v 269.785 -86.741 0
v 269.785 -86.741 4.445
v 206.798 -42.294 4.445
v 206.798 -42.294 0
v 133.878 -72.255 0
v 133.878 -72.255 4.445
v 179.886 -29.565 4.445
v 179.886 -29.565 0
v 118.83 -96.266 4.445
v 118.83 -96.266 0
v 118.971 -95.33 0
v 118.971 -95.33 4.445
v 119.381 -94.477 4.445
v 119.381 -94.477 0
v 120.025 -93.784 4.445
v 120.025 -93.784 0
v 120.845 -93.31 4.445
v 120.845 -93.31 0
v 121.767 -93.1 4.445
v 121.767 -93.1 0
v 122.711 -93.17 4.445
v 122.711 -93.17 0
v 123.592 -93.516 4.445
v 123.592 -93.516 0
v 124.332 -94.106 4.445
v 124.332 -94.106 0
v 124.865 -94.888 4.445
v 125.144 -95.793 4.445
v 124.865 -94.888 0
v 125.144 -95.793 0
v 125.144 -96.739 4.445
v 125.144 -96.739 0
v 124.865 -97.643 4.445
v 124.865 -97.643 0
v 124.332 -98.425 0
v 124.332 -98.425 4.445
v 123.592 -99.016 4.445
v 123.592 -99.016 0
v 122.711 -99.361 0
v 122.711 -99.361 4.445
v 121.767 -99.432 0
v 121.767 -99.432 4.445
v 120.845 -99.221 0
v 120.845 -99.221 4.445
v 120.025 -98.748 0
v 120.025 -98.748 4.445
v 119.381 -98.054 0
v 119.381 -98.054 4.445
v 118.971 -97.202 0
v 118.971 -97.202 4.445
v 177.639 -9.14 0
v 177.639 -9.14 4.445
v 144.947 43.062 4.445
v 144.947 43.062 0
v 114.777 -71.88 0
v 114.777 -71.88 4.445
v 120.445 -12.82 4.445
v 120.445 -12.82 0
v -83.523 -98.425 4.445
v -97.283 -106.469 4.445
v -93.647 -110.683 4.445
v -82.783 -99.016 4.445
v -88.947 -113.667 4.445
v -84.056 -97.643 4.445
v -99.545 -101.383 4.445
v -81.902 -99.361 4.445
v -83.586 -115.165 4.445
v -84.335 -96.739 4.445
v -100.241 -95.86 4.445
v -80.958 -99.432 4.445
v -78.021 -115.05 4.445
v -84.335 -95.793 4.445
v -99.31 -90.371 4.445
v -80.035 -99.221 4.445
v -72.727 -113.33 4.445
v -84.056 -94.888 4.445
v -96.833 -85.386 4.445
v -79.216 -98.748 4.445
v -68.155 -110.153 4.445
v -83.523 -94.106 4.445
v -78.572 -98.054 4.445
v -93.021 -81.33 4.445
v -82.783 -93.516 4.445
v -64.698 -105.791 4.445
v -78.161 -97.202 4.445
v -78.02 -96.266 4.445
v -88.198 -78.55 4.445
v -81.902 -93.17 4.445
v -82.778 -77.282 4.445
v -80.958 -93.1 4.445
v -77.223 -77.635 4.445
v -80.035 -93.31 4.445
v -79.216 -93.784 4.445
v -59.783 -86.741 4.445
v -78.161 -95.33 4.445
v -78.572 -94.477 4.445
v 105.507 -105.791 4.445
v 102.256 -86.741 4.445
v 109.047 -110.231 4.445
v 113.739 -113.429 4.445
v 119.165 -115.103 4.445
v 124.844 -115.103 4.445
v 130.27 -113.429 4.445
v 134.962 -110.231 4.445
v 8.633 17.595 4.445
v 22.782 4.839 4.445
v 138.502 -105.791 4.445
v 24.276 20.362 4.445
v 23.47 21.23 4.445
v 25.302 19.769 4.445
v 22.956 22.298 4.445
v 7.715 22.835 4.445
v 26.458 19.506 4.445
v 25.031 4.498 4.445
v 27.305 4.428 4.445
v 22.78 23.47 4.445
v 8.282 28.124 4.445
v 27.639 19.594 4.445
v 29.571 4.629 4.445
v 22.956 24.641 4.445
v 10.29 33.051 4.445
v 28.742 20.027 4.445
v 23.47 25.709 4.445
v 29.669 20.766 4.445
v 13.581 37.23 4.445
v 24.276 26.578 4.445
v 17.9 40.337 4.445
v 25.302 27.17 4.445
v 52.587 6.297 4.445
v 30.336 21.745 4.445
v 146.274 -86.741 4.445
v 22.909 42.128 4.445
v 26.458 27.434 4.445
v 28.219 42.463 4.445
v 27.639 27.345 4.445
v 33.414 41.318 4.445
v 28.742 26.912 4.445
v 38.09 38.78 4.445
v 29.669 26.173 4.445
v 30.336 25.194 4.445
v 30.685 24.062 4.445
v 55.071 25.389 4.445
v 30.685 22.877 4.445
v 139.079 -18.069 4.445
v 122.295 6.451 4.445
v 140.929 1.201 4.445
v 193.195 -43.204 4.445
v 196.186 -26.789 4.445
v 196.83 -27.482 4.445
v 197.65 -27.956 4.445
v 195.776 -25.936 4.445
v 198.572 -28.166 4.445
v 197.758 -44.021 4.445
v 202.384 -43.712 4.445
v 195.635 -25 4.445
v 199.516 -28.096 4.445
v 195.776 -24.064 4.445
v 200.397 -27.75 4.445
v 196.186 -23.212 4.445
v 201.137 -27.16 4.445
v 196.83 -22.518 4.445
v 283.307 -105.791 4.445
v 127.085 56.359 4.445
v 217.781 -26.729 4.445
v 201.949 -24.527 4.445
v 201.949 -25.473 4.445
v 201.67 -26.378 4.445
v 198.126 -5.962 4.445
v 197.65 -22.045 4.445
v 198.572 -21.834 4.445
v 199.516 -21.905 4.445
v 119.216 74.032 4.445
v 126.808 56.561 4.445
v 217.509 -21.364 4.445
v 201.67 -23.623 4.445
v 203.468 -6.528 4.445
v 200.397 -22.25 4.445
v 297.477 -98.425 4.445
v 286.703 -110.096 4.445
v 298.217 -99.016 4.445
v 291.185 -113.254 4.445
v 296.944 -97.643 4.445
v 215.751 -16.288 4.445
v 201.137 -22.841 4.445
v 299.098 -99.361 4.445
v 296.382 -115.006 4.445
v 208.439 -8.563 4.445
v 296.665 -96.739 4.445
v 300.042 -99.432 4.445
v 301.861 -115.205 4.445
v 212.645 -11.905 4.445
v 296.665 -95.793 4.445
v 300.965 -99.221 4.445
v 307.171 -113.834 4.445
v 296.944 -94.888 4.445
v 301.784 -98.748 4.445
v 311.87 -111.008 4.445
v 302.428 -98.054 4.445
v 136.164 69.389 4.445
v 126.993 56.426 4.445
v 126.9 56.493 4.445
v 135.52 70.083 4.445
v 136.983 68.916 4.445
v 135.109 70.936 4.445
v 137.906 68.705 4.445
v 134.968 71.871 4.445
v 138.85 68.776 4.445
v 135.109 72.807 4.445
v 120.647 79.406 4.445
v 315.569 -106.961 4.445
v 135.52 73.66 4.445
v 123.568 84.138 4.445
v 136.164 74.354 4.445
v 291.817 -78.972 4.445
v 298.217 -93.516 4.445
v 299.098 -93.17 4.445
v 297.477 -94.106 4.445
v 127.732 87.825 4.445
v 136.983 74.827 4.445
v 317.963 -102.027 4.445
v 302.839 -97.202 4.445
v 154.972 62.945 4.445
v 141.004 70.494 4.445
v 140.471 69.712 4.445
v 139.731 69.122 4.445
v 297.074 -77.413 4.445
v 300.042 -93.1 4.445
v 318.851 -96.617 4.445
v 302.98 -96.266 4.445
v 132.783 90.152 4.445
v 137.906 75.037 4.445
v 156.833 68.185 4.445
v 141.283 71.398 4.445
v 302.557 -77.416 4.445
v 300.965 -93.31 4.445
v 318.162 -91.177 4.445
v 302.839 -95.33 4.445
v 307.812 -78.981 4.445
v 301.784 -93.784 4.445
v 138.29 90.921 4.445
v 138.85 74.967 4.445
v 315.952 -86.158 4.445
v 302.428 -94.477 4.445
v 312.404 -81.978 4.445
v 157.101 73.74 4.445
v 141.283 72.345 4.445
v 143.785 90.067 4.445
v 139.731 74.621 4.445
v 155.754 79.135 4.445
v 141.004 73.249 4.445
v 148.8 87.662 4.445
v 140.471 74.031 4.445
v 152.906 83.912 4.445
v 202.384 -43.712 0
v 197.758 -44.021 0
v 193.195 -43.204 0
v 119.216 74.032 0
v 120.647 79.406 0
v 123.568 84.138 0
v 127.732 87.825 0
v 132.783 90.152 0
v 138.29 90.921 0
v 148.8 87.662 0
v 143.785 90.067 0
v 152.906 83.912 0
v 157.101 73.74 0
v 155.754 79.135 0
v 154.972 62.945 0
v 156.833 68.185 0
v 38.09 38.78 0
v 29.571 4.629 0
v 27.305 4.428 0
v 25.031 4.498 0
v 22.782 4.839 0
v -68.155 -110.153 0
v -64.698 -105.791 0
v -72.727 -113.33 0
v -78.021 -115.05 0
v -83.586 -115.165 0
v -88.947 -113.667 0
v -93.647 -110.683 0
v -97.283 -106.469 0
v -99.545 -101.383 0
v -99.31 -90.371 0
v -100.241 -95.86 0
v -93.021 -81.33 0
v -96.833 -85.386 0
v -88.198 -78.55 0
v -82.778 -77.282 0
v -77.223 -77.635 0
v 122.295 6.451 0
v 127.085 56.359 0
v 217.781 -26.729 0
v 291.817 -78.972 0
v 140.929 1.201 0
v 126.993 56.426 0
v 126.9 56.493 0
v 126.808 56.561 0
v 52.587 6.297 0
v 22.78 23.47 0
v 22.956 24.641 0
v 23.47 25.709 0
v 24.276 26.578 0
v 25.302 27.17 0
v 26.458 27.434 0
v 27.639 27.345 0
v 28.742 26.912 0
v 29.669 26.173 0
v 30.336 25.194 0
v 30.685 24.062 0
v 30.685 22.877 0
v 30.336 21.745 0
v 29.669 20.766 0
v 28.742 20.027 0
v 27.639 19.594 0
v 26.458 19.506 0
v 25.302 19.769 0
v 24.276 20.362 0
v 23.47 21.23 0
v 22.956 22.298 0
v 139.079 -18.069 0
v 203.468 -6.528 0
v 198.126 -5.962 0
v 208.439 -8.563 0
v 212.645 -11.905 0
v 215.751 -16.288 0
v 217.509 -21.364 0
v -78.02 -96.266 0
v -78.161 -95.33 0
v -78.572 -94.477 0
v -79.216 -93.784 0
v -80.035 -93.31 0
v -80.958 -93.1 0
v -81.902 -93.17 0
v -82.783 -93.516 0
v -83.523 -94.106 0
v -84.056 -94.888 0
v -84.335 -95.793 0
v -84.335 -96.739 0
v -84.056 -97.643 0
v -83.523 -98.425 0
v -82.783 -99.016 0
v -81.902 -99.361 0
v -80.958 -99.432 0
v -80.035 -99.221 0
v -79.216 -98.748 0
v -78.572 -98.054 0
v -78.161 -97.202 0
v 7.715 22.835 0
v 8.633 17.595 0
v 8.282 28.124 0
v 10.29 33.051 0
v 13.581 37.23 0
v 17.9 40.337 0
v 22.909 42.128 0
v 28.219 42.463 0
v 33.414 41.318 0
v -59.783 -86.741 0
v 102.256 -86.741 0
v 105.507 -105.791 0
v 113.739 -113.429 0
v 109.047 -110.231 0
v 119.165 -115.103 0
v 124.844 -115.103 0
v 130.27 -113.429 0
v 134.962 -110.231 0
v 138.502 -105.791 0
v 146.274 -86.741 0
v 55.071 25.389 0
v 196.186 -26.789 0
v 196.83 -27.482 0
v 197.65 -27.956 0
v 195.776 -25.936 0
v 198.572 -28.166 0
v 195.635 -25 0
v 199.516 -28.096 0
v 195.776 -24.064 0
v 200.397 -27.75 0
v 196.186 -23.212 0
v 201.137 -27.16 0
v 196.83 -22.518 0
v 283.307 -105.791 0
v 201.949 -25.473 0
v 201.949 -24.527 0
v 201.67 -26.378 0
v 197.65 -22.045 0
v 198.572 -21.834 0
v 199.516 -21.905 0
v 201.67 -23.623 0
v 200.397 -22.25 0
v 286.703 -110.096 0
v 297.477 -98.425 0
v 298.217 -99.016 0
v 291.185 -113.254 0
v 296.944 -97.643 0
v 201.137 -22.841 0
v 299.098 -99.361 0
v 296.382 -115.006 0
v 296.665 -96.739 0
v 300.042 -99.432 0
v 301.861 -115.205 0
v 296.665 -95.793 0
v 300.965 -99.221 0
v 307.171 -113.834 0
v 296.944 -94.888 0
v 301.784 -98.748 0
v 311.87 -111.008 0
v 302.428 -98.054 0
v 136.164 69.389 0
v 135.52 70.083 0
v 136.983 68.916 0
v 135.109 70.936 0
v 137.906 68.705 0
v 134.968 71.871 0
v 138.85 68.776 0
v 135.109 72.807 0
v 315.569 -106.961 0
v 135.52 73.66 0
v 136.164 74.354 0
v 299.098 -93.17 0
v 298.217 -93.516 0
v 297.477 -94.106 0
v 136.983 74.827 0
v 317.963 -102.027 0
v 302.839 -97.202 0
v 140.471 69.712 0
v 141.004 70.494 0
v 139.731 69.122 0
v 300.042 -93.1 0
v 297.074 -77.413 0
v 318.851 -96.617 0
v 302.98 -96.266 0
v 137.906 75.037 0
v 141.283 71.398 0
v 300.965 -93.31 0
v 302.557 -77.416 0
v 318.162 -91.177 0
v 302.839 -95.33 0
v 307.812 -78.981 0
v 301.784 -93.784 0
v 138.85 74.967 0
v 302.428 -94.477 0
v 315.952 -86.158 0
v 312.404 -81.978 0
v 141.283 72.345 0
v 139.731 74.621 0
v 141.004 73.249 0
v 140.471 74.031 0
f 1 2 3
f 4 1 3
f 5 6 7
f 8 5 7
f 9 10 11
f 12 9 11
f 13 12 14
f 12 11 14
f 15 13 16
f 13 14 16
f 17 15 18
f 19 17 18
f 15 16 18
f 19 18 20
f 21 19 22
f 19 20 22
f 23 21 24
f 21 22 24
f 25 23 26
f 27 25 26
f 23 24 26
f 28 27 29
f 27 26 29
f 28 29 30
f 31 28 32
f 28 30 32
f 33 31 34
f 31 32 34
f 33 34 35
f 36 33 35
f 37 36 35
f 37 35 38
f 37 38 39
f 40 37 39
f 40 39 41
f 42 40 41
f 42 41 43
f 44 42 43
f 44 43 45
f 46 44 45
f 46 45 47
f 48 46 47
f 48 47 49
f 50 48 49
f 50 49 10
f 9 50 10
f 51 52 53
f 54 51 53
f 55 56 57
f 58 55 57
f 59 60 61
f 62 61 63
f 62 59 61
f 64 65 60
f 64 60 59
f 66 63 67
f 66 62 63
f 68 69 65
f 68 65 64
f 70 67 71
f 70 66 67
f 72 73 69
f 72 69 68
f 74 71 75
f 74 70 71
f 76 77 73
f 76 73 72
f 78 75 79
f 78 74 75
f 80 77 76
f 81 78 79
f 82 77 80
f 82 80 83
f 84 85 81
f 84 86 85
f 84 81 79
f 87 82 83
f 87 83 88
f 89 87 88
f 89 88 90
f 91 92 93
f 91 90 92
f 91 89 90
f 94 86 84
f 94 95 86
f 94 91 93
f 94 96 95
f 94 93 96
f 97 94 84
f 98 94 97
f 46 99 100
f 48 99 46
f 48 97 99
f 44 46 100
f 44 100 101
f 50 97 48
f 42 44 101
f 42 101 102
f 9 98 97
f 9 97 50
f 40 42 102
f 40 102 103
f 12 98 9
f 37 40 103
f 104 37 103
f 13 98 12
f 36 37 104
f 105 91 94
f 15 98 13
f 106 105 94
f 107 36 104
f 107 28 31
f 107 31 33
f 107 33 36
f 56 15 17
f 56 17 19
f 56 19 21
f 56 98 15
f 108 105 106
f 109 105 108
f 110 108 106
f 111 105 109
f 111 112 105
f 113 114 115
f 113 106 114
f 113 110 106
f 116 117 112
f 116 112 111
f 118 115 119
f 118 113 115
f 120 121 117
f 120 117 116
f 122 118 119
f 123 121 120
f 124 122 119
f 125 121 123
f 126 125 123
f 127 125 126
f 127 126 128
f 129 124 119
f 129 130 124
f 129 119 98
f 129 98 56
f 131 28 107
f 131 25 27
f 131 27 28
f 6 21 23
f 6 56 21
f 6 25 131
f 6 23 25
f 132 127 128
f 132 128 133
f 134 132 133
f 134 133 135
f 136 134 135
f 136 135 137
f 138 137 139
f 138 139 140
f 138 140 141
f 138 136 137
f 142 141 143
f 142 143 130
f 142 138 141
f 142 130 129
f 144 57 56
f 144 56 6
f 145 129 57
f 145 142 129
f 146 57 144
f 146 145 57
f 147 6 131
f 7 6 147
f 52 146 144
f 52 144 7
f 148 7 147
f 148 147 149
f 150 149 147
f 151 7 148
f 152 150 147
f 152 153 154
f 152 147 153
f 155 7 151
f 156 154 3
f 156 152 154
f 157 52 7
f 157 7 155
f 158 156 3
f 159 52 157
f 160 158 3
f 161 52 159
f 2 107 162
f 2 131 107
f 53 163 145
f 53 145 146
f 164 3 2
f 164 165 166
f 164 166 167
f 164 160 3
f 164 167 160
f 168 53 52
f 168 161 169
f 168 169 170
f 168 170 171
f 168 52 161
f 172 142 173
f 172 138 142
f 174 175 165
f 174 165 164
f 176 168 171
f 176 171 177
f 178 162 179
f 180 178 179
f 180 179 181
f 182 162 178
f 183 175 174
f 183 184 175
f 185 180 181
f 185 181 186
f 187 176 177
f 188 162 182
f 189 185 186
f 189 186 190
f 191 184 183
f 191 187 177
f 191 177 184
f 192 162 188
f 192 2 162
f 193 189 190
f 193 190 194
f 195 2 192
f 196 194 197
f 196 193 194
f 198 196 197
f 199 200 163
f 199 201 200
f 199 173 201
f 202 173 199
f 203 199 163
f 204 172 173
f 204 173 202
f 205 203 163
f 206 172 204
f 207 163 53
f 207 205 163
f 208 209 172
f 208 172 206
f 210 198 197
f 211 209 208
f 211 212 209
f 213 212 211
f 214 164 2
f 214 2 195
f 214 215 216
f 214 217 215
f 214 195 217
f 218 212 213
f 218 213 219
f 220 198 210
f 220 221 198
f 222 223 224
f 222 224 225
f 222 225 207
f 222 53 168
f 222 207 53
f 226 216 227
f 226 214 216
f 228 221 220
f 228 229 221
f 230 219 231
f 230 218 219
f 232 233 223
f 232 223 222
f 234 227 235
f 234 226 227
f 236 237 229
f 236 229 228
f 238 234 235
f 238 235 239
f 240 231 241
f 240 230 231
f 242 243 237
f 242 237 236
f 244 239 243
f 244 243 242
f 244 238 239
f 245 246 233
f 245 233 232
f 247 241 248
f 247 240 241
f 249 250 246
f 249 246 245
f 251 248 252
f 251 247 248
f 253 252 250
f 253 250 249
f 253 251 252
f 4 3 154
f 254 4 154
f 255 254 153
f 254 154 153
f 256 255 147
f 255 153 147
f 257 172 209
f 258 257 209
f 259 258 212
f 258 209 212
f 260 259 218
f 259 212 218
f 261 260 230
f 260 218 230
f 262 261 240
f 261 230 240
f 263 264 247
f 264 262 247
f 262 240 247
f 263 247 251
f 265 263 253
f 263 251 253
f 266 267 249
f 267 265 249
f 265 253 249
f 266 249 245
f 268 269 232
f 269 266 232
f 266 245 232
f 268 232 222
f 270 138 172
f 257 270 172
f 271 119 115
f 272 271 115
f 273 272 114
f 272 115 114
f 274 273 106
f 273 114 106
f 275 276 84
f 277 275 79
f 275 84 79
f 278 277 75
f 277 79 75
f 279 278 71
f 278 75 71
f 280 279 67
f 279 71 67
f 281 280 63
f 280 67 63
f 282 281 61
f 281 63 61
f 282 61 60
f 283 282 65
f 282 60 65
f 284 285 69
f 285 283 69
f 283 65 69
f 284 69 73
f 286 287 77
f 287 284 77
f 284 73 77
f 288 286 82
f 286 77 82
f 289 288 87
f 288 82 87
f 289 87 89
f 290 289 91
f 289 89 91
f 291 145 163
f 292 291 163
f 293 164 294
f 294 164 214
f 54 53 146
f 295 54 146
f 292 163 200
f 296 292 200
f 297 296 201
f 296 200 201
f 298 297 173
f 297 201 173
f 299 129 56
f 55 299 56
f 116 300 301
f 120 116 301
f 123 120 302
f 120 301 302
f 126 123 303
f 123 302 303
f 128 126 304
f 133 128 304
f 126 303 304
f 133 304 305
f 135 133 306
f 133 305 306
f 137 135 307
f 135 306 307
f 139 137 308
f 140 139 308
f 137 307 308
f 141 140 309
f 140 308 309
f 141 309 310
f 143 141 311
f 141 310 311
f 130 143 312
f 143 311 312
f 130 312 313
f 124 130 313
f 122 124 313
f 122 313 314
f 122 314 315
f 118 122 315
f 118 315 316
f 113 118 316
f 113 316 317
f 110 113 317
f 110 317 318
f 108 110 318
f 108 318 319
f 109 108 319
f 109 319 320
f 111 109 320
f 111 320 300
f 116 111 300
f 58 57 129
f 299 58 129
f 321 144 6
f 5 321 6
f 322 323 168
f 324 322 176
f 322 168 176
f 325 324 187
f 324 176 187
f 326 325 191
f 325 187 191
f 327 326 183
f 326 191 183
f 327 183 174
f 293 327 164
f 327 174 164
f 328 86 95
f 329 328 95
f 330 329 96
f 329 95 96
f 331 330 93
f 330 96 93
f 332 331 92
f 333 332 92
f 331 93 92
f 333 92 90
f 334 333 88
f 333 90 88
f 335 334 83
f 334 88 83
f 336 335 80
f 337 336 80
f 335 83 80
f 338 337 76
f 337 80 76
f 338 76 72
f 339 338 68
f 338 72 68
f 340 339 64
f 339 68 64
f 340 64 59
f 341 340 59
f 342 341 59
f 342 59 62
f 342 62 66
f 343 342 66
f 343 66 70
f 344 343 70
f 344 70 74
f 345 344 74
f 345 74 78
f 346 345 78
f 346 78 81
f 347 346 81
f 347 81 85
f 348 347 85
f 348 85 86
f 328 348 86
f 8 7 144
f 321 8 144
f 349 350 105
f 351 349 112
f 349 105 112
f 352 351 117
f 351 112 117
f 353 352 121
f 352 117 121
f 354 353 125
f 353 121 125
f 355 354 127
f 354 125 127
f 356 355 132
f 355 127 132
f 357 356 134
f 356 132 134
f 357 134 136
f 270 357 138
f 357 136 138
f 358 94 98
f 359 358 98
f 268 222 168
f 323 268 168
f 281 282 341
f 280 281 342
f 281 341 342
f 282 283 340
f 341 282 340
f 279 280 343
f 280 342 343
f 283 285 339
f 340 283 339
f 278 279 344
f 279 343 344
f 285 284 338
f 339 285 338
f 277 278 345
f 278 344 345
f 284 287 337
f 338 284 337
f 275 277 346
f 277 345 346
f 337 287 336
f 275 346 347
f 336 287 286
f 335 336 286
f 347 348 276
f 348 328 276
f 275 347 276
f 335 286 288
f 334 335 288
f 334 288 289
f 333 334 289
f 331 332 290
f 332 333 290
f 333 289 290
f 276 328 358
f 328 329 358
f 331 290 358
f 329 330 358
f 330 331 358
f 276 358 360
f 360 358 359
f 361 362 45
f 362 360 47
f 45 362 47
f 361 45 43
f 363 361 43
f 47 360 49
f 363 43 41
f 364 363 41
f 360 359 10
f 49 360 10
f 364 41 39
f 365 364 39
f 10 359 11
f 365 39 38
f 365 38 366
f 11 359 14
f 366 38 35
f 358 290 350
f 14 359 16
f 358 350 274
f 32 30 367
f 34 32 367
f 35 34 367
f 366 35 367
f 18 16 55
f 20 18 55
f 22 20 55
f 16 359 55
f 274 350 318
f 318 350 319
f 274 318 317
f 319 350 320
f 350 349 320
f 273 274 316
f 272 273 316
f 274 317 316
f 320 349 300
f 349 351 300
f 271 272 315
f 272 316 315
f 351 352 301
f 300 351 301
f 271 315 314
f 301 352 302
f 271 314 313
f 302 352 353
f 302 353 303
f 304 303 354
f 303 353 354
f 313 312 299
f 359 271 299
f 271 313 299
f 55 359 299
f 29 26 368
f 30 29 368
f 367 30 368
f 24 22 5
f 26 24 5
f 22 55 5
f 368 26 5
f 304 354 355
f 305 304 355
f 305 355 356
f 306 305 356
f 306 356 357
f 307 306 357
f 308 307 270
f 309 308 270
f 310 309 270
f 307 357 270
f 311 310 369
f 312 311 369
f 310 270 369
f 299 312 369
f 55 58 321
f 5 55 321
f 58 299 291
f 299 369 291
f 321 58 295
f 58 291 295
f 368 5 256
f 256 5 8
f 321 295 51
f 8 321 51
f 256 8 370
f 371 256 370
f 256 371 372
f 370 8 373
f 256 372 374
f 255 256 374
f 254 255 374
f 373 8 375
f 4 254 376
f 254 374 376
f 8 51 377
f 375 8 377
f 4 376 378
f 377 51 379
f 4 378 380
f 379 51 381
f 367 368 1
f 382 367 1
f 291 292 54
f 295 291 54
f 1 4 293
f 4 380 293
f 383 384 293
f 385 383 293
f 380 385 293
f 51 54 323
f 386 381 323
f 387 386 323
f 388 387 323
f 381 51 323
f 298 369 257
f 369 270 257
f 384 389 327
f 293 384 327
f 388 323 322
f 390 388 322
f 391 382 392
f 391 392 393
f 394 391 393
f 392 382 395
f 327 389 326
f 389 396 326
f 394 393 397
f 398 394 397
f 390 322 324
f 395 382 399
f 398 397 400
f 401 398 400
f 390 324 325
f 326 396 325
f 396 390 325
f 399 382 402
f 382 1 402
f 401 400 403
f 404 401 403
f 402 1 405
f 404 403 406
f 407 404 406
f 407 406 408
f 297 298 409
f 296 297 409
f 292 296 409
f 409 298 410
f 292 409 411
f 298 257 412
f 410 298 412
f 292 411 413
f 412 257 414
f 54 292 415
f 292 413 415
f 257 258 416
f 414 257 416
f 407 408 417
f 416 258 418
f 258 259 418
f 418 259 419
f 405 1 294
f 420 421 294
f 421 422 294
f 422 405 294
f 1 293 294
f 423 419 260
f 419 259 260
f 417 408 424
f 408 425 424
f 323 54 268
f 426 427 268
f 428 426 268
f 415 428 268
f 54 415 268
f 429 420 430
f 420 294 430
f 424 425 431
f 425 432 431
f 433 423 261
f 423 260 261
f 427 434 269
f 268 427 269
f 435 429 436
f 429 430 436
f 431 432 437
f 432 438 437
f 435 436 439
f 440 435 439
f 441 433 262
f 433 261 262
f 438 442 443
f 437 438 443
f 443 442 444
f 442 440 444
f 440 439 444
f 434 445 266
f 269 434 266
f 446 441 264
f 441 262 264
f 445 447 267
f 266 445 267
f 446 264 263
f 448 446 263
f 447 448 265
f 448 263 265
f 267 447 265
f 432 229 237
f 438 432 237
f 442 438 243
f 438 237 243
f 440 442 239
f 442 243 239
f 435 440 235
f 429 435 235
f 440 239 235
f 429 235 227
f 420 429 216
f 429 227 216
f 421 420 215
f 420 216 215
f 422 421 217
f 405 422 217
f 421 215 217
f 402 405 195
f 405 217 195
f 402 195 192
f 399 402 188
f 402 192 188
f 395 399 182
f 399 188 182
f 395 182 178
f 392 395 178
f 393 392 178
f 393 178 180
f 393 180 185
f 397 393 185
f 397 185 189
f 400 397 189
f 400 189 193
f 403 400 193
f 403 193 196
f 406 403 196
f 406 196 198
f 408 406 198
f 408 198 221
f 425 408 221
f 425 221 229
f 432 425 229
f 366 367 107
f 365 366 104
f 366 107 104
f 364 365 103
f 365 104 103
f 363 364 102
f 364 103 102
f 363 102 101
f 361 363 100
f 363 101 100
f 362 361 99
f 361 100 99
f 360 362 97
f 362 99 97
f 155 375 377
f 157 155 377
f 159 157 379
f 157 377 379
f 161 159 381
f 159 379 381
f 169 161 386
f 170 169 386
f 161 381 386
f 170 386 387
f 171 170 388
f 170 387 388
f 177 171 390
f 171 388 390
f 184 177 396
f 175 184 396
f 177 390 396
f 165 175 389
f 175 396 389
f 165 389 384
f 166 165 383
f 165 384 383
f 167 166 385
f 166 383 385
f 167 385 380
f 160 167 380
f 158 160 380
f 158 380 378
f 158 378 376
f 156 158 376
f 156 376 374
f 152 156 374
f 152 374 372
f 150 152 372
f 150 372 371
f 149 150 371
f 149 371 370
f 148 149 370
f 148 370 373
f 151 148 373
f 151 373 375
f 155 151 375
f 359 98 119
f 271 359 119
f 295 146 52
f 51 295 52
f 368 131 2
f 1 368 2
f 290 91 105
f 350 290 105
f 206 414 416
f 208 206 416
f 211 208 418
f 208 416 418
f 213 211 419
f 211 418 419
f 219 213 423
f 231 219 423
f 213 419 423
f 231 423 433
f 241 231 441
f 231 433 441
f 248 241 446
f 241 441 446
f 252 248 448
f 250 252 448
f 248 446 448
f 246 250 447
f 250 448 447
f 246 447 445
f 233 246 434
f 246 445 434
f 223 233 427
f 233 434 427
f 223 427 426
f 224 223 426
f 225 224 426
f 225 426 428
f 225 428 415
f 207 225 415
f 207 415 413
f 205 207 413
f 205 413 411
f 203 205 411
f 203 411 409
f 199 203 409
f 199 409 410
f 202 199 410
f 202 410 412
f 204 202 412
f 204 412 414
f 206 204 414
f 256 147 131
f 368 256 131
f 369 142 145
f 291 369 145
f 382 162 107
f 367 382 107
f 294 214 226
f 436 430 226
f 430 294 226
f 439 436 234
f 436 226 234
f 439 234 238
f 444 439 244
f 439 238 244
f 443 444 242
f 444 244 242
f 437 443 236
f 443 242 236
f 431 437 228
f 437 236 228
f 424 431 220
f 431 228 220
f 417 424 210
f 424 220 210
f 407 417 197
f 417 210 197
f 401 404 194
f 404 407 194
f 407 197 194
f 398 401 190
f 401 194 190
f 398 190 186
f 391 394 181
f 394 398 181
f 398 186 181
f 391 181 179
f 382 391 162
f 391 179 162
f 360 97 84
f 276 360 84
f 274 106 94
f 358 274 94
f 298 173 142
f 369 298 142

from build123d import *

# Parameters (mm, degrees)
SKETCH2_W           = 635
SKETCH2_H           = 635
BOSS_EXTRUDE3_DEPTH = 4.445
SKETCH3_R           = 3.175
SKETCH3_R_2         = 3.9751
CUT_EXTRUDE1_DEPTH  = 631.349772348
SKETCH4_W           = 635
SKETCH4_H           = 635
SKETCH4_R           = 3.175
CUT_EXTRUDE2_DEPTH  = 631.349772348


with BuildPart() as part:
    # Sketch2 → Boss-Extrude3 (new body)
    with BuildSketch(Plane.XY):
        with Locations((164.767692446, -88.380463065)):
            Rectangle(SKETCH2_W, SKETCH2_H)
    extrude(amount=BOSS_EXTRUDE3_DEPTH)

    # Sketch3 → Cut-Extrude1 (cut, through all)
    with BuildSketch(Plane(origin=(0, 0, 0), x_dir=(-1, 0, 0), z_dir=(0, 0, -1))):
        with Locations((-138.143199548, 71.871365193)):
            Circle(SKETCH3_R)
        with Locations((-198.809547248, -25.000118004)):
            Circle(SKETCH3_R)
        with Locations((-122.004659563, -96.265887155)):
            Circle(SKETCH3_R)
        with Locations((-26.754659563, 23.469712845)):
            Circle(SKETCH3_R_2)
    extrude(amount=-CUT_EXTRUDE1_DEPTH, mode=Mode.SUBTRACT)

    # Sketch4 → Cut-Extrude2 (cut, through all)
    # profile 1 of 9: a face of its own
    with BuildSketch(Plane.XY.offset(4.445)):
        with Locations((164.767692446, -88.380463065)):
            Rectangle(SKETCH4_W, SKETCH4_H)
        with BuildLine():
            Line((-77.2226341, -77.634727654), (8.633248965, 17.594597704))
            ThreePointArc((8.633248965, 17.594597704), (15.63151489, 38.935098471), (38.089671454, 38.780493538))
            Line((38.089671454, 38.780493538), (119.216168571, 74.032383096))
            ThreePointArc((119.216168571, 74.032383096), (143.785411305, 90.066637834), (154.972256192, 62.944699943))
            Line((154.972256192, 62.944699943), (198.125737804, -5.962394804))
            ThreePointArc((198.125737804, -5.962394804), (212.645203515, -11.905190907), (217.780898828, -26.729371954))
            Line((217.780898828, -26.729371954), (291.816561623, -78.971587768))
            ThreePointArc((291.816561623, -78.971587768), (317.962531349, -102.027327271), (283.306875621, -105.790887155))
            Line((283.306875621, -105.790887155), (138.502443505, -105.790887155))
            ThreePointArc((138.502443505, -105.790887155), (122.004659563, -115.315887155), (105.506875621, -105.790887155))
            Line((105.506875621, -105.790887155), (-64.697556495, -105.790887155))
            ThreePointArc((-64.697556495, -105.790887155), (-98.60087325, -104.008621005), (-77.2226341, -77.634727654))
        make_face(mode=Mode.SUBTRACT)
    # profile 2 of 9: a face of its own
    with BuildSketch(Plane.XY.offset(4.445)):
        with BuildLine():
            Line((146.273652248, -86.740887155), (269.785475941, -86.740887155))
            Line((269.785475941, -86.740887155), (206.797645188, -42.294417391))
            ThreePointArc((206.797645188, -42.294417391), (200.080272342, -44.007689067), (193.194620104, -43.203828976))
            Line((193.194620104, -43.203828976), (146.273652248, -86.740887155))
        make_face()
    # profile 3 of 9: a face of its own
    with BuildSketch(Plane.XY.offset(4.445)):
        Polygon((144.946705866, 43.06176458), (140.928758156, 1.201305791), (177.638536292, -9.140258814), align=None)
    # profile 4 of 9: a face of its own
    with BuildSketch(Plane.XY.offset(4.445)):
        Polygon((179.886249099, -29.564951481), (139.079100318, -18.069110674), (133.87810257, -72.255020413), align=None)
    # profile 5 of 9: a face of its own
    with BuildSketch(Plane.XY.offset(4.445)):
        with BuildLine():
            Line((55.070704112, 25.388502171), (122.29505865, 6.450632186))
            Line((122.29505865, 6.450632186), (127.085491453, 56.359125133))
            ThreePointArc((127.085491453, 56.359125133), (126.946386449, 56.459231128), (126.808187657, 56.5605845))
            Line((126.808187657, 56.5605845), (55.070704112, 25.388502171))
        make_face()
    # profile 6 of 9: a face of its own
    with BuildSketch(Plane.XY.offset(4.445)):
        Polygon((120.445400812, -12.81978428), (52.587094953, 6.296677047), (114.776579601, -71.879651121), align=None)
    # profile 7 of 9: a face of its own
    with BuildSketch(Plane.XY.offset(4.445)):
        with BuildLine():
            Line((102.256257742, -86.740887155), (29.57120013, 4.629075933))
            ThreePointArc((29.57120013, 4.629075933), (26.167164867, 4.428774056), (22.781953227, 4.838553344))
            Line((22.781953227, 4.838553344), (-59.783303905, -86.740887155))
            Line((-59.783303905, -86.740887155), (102.256257742, -86.740887155))
        make_face()
    # profile 8 of 9: a face of its own
    with BuildSketch(Plane.XY.offset(4.445)):
        with Locations((299.804659563, -96.265887155)):
            Circle(SKETCH4_R)
    # profile 9 of 9: a face of its own
    with BuildSketch(Plane.XY.offset(4.445)):
        with Locations((-81.195340437, -96.265887155)):
            Circle(SKETCH4_R)
    extrude(amount=-CUT_EXTRUDE2_DEPTH, mode=Mode.SUBTRACT)


solid = part.part
